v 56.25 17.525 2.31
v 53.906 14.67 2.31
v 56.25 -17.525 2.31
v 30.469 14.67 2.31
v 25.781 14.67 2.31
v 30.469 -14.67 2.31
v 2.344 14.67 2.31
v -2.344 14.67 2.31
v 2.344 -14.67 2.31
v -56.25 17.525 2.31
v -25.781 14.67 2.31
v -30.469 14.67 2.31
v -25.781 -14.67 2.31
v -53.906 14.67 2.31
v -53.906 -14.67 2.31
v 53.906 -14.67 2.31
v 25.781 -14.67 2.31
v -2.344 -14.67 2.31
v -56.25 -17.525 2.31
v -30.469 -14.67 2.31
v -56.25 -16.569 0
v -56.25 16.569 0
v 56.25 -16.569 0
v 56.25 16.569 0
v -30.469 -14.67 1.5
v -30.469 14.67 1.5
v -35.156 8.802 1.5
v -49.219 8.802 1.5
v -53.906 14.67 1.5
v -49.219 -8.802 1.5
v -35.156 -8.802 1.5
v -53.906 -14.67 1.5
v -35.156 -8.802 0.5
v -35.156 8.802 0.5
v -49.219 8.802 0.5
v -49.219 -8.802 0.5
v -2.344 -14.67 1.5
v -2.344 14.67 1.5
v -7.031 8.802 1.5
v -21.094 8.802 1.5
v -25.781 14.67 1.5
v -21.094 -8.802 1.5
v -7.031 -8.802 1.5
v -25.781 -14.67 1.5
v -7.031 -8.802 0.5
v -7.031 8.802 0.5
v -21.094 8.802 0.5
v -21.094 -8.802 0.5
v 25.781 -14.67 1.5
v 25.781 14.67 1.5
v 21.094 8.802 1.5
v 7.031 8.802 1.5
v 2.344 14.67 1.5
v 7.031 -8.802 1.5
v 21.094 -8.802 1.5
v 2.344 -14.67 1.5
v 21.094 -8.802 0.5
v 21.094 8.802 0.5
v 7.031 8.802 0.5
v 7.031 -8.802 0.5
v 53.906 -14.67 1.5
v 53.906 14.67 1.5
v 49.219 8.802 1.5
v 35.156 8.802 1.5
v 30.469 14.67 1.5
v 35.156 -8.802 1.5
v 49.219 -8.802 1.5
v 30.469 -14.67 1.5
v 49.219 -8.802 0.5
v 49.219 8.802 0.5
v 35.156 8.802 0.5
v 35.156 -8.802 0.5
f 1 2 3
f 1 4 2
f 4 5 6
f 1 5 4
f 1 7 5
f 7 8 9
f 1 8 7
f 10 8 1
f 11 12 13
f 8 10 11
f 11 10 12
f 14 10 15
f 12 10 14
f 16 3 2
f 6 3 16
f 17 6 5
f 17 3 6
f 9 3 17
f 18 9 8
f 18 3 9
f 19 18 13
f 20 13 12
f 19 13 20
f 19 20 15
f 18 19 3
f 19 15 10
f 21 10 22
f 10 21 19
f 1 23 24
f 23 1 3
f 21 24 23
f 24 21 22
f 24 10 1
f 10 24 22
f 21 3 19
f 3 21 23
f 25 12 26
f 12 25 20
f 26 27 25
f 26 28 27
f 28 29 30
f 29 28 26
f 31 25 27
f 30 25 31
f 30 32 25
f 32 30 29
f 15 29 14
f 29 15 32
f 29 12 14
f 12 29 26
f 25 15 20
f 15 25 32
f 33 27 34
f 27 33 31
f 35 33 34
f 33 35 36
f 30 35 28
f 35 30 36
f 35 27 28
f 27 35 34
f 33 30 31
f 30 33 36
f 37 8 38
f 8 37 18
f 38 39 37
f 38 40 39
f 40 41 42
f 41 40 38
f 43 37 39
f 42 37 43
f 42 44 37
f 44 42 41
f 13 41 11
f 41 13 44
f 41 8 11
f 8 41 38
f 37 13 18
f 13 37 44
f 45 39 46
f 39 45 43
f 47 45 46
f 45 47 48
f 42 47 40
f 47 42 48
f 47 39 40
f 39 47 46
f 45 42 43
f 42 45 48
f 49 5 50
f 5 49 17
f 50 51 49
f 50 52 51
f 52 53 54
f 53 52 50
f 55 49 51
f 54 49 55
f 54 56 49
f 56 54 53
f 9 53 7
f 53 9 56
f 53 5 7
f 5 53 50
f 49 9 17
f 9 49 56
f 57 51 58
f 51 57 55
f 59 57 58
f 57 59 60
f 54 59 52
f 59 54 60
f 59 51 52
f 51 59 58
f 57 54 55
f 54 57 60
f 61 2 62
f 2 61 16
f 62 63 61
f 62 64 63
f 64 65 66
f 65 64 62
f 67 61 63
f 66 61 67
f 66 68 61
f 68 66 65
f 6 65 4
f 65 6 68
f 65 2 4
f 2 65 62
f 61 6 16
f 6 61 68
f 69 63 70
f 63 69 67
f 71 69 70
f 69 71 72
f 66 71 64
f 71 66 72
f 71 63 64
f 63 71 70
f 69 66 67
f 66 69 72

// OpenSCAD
// file: ../lib/project/cache_pot_geometry.scad
// Shared paneled cache pot geometry helpers.

function cache_pot_outside_height(inside_height, bottom_thickness) =
  inside_height + bottom_thickness;

function cache_pot_outside_radius(inside_radius, min_wall_thickness, num_panels) =
  (inside_radius + min_wall_thickness) / cos(180 / num_panels);

function cache_pot_panel_extra_radius(panel_thickness, num_panels) =
  panel_thickness / cos(180 / num_panels);

function cache_pot_panel_width(outside_radius, panel_thickness, num_panels) =
  (outside_radius + cache_pot_panel_extra_radius(panel_thickness, num_panels)) *
  2 * sin(180 / num_panels);

module cache_pot_outside_cylinder(outside_height, outside_radius, num_panels) {
  cylinder(outside_height, outside_radius, outside_radius, $fn = num_panels);
}

module cache_pot_inside_cutout(
  inside_height,
  inside_radius,
  bottom_thickness,
  bottom_edge_width
) {
  translate([0, 0, bottom_thickness])
    cylinder(inside_height + 1, inside_radius, inside_radius);
  translate([0, 0, -0.5 * bottom_thickness])
    cylinder(
      2 * bottom_thickness,
      inside_radius - bottom_edge_width,
      inside_radius - bottom_edge_width
    );
}

module cache_pot_core(
  inside_height,
  inside_radius,
  bottom_thickness,
  bottom_edge_width,
  outside_height,
  outside_radius,
  num_panels
) {
  difference() {
    cache_pot_outside_cylinder(outside_height, outside_radius, num_panels);
    cache_pot_inside_cutout(
      inside_height,
      inside_radius,
      bottom_thickness,
      bottom_edge_width
    );
  }
}

module cache_pot_panel_shell(
  outside_height,
  outside_radius,
  panel_thickness,
  num_panels
) {
  difference() {
    cylinder(
      outside_height,
      outside_radius + panel_thickness,
      outside_radius + panel_thickness,
      $fn = num_panels
    );
    translate([0, 0, -1])
      cylinder(outside_height + 2, outside_radius, outside_radius, $fn = num_panels);
    translate([-(outside_radius + panel_thickness + 1), 0, -1])
      cube([
        2 * (outside_radius + panel_thickness + 1),
        2 * (outside_radius + panel_thickness + 1),
        outside_height + 2
      ]);
    rotate([0, 0, 180 - 360 / num_panels])
      translate([-(outside_radius + panel_thickness + 1), 0, -1])
        cube([
          2 * (outside_radius + panel_thickness + 1),
          2 * (outside_radius + panel_thickness + 1),
          outside_height + 2
        ]);
  }
}

module cache_pot_panel_flat_on_bed(
  inside_radius,
  min_wall_thickness,
  outside_height,
  num_panels,
  outside_radius,
  panel_thickness
) {
  translate([outside_height / 2, 0, -(inside_radius + min_wall_thickness)])
    rotate([0, -90, 0])
      rotate([0, 0, 180 / num_panels])
        cache_pot_panel_shell(
          outside_height = outside_height,
          outside_radius = outside_radius,
          panel_thickness = panel_thickness,
          num_panels = num_panels
        );
}
// main file
// Paneled cache pot rectangles panel.

use <../lib/project/cache_pot_geometry.scad>;

// ---------- Public parameters (mm) ----------
inside_radius = 75 / 2;
inside_height = 110;
min_wall_thickness = 2.5;
bottom_thickness = 2.5;
bottom_edge_width = 10;
num_panels = 8;
panel_thickness = 2.5;
groove_depth = 1.0;

// ---------- Resolution ----------
$fa = 1;
$fs = 1;

// ---------- Derived ----------
outside_height = cache_pot_outside_height(inside_height, bottom_thickness);
outside_radius = cache_pot_outside_radius(inside_radius, min_wall_thickness, num_panels);
panel_width = cache_pot_panel_width(outside_radius, panel_thickness, num_panels);

module panel_groove() {
    groove_x = outside_height / 4;
    groove_y = panel_width;
    translate([0, 0, panel_thickness * 1.5 - groove_depth]) cube([groove_x * 5 / 6, groove_y * 5 / 6, panel_thickness], center=true);
    translate([0, 0, panel_thickness * 1.5 - 2 * groove_depth]) cube([groove_x * 3 / 6, groove_y * 3 / 6, panel_thickness], center=true);
}

module grooved_panel() {
    groove_x = outside_height / 4;
    difference() {
        cache_pot_panel_flat_on_bed(
          inside_radius = inside_radius,
          min_wall_thickness = min_wall_thickness,
          outside_height = outside_height,
          num_panels = num_panels,
          outside_radius = outside_radius,
          panel_thickness = panel_thickness
        );
        translate([-1.5 * groove_x, 0, 0]) panel_groove();
        translate([-0.5 * groove_x, 0, 0]) panel_groove();
        translate([0.5 * groove_x, 0, 0]) panel_groove();
        translate([1.5 * groove_x, 0, 0]) panel_groove();
    }
}

grooved_panel();
//color("red") panel();
//color("yellow") core();
